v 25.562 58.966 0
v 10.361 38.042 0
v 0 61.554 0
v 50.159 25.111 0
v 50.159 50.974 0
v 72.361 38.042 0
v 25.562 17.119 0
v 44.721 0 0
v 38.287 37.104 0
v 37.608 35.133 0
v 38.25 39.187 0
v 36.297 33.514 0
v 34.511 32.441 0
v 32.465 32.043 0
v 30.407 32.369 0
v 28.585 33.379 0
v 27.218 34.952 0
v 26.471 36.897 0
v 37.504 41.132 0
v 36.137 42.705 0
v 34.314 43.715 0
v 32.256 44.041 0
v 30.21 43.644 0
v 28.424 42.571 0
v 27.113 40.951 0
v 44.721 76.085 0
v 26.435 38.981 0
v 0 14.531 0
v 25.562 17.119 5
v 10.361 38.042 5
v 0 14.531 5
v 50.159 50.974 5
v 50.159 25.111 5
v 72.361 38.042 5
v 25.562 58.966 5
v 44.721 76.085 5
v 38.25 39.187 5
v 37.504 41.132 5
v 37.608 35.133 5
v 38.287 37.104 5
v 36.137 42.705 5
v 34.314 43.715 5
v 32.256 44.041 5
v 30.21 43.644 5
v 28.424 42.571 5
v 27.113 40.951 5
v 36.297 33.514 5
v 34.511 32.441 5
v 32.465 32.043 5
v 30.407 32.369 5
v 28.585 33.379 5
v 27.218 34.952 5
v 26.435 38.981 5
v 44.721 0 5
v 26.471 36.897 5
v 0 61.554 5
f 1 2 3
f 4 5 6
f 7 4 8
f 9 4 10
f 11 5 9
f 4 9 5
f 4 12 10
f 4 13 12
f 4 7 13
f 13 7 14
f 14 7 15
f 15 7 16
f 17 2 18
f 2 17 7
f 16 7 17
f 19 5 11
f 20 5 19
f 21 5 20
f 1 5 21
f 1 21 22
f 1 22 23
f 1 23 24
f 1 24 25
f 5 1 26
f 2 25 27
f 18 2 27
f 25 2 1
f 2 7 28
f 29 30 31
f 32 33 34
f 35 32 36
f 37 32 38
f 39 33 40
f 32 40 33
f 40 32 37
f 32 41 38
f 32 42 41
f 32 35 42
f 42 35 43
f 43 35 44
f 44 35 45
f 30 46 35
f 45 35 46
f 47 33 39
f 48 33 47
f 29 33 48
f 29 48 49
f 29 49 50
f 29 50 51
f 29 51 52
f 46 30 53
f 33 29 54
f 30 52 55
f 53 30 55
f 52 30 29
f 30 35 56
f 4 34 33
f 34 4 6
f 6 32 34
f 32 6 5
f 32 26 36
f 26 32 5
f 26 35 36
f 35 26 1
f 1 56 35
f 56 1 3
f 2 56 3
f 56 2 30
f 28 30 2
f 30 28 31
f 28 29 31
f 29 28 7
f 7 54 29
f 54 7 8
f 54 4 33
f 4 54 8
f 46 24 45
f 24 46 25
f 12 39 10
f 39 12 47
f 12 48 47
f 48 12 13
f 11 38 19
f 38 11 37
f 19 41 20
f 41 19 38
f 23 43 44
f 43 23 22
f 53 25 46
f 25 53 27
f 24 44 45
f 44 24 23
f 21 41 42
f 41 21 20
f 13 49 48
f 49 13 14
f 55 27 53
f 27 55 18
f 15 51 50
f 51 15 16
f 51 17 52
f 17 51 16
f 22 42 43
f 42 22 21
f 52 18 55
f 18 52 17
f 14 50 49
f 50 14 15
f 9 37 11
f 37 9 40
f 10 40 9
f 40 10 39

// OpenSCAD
$fn = 32;

// ----------------------------------------------------------------------
// Star wheel: 5-point star, R40
// ----------------------------------------------------------------------

// --- parameters (mm) ---
n_points = 5;             // number of points / teeth
r_out = 40;               // tip radius
r_in = 22;                // root radius
bore_r = 6;               // centre bore radius
plate_t = 5;              // plate thickness, Z (extrusion height)
bore_d = 12;              // centre bore diameter
fit_tol = 0.1;            // declared fit tolerance (prompt contract)
free_tol = 0.5;           // declared free tolerance (prompt contract)

profile = [[72.361, 38.042], [50.159, 50.974], [44.721, 76.085], [25.562, 58.966], [0, 61.554], [10.361, 38.042], [0, 14.531], [25.562, 17.119], [44.721, 0], [50.159, 25.111]];  // primary outline, 10 points, counter clockwise
void_1 = [[38.25, 39.187], [37.504, 41.132], [36.137, 42.705], [34.314, 43.715], [32.256, 44.041], [30.21, 43.644], [28.424, 42.571], [27.113, 40.951], [26.435, 38.981], [26.471, 36.897], [27.218, 34.952], [28.585, 33.379], [30.407, 32.369], [32.465, 32.043], [34.511, 32.441], [36.297, 33.514], [37.608, 35.133], [38.287, 37.104]];  // centre bore, 18 points

// --- the one profile operation ---
difference() {
  linear_extrude(height = plate_t) polygon(points = profile);
  translate([0, 0, -1])
    linear_extrude(height = plate_t + 2) polygon(points = void_1);
}
